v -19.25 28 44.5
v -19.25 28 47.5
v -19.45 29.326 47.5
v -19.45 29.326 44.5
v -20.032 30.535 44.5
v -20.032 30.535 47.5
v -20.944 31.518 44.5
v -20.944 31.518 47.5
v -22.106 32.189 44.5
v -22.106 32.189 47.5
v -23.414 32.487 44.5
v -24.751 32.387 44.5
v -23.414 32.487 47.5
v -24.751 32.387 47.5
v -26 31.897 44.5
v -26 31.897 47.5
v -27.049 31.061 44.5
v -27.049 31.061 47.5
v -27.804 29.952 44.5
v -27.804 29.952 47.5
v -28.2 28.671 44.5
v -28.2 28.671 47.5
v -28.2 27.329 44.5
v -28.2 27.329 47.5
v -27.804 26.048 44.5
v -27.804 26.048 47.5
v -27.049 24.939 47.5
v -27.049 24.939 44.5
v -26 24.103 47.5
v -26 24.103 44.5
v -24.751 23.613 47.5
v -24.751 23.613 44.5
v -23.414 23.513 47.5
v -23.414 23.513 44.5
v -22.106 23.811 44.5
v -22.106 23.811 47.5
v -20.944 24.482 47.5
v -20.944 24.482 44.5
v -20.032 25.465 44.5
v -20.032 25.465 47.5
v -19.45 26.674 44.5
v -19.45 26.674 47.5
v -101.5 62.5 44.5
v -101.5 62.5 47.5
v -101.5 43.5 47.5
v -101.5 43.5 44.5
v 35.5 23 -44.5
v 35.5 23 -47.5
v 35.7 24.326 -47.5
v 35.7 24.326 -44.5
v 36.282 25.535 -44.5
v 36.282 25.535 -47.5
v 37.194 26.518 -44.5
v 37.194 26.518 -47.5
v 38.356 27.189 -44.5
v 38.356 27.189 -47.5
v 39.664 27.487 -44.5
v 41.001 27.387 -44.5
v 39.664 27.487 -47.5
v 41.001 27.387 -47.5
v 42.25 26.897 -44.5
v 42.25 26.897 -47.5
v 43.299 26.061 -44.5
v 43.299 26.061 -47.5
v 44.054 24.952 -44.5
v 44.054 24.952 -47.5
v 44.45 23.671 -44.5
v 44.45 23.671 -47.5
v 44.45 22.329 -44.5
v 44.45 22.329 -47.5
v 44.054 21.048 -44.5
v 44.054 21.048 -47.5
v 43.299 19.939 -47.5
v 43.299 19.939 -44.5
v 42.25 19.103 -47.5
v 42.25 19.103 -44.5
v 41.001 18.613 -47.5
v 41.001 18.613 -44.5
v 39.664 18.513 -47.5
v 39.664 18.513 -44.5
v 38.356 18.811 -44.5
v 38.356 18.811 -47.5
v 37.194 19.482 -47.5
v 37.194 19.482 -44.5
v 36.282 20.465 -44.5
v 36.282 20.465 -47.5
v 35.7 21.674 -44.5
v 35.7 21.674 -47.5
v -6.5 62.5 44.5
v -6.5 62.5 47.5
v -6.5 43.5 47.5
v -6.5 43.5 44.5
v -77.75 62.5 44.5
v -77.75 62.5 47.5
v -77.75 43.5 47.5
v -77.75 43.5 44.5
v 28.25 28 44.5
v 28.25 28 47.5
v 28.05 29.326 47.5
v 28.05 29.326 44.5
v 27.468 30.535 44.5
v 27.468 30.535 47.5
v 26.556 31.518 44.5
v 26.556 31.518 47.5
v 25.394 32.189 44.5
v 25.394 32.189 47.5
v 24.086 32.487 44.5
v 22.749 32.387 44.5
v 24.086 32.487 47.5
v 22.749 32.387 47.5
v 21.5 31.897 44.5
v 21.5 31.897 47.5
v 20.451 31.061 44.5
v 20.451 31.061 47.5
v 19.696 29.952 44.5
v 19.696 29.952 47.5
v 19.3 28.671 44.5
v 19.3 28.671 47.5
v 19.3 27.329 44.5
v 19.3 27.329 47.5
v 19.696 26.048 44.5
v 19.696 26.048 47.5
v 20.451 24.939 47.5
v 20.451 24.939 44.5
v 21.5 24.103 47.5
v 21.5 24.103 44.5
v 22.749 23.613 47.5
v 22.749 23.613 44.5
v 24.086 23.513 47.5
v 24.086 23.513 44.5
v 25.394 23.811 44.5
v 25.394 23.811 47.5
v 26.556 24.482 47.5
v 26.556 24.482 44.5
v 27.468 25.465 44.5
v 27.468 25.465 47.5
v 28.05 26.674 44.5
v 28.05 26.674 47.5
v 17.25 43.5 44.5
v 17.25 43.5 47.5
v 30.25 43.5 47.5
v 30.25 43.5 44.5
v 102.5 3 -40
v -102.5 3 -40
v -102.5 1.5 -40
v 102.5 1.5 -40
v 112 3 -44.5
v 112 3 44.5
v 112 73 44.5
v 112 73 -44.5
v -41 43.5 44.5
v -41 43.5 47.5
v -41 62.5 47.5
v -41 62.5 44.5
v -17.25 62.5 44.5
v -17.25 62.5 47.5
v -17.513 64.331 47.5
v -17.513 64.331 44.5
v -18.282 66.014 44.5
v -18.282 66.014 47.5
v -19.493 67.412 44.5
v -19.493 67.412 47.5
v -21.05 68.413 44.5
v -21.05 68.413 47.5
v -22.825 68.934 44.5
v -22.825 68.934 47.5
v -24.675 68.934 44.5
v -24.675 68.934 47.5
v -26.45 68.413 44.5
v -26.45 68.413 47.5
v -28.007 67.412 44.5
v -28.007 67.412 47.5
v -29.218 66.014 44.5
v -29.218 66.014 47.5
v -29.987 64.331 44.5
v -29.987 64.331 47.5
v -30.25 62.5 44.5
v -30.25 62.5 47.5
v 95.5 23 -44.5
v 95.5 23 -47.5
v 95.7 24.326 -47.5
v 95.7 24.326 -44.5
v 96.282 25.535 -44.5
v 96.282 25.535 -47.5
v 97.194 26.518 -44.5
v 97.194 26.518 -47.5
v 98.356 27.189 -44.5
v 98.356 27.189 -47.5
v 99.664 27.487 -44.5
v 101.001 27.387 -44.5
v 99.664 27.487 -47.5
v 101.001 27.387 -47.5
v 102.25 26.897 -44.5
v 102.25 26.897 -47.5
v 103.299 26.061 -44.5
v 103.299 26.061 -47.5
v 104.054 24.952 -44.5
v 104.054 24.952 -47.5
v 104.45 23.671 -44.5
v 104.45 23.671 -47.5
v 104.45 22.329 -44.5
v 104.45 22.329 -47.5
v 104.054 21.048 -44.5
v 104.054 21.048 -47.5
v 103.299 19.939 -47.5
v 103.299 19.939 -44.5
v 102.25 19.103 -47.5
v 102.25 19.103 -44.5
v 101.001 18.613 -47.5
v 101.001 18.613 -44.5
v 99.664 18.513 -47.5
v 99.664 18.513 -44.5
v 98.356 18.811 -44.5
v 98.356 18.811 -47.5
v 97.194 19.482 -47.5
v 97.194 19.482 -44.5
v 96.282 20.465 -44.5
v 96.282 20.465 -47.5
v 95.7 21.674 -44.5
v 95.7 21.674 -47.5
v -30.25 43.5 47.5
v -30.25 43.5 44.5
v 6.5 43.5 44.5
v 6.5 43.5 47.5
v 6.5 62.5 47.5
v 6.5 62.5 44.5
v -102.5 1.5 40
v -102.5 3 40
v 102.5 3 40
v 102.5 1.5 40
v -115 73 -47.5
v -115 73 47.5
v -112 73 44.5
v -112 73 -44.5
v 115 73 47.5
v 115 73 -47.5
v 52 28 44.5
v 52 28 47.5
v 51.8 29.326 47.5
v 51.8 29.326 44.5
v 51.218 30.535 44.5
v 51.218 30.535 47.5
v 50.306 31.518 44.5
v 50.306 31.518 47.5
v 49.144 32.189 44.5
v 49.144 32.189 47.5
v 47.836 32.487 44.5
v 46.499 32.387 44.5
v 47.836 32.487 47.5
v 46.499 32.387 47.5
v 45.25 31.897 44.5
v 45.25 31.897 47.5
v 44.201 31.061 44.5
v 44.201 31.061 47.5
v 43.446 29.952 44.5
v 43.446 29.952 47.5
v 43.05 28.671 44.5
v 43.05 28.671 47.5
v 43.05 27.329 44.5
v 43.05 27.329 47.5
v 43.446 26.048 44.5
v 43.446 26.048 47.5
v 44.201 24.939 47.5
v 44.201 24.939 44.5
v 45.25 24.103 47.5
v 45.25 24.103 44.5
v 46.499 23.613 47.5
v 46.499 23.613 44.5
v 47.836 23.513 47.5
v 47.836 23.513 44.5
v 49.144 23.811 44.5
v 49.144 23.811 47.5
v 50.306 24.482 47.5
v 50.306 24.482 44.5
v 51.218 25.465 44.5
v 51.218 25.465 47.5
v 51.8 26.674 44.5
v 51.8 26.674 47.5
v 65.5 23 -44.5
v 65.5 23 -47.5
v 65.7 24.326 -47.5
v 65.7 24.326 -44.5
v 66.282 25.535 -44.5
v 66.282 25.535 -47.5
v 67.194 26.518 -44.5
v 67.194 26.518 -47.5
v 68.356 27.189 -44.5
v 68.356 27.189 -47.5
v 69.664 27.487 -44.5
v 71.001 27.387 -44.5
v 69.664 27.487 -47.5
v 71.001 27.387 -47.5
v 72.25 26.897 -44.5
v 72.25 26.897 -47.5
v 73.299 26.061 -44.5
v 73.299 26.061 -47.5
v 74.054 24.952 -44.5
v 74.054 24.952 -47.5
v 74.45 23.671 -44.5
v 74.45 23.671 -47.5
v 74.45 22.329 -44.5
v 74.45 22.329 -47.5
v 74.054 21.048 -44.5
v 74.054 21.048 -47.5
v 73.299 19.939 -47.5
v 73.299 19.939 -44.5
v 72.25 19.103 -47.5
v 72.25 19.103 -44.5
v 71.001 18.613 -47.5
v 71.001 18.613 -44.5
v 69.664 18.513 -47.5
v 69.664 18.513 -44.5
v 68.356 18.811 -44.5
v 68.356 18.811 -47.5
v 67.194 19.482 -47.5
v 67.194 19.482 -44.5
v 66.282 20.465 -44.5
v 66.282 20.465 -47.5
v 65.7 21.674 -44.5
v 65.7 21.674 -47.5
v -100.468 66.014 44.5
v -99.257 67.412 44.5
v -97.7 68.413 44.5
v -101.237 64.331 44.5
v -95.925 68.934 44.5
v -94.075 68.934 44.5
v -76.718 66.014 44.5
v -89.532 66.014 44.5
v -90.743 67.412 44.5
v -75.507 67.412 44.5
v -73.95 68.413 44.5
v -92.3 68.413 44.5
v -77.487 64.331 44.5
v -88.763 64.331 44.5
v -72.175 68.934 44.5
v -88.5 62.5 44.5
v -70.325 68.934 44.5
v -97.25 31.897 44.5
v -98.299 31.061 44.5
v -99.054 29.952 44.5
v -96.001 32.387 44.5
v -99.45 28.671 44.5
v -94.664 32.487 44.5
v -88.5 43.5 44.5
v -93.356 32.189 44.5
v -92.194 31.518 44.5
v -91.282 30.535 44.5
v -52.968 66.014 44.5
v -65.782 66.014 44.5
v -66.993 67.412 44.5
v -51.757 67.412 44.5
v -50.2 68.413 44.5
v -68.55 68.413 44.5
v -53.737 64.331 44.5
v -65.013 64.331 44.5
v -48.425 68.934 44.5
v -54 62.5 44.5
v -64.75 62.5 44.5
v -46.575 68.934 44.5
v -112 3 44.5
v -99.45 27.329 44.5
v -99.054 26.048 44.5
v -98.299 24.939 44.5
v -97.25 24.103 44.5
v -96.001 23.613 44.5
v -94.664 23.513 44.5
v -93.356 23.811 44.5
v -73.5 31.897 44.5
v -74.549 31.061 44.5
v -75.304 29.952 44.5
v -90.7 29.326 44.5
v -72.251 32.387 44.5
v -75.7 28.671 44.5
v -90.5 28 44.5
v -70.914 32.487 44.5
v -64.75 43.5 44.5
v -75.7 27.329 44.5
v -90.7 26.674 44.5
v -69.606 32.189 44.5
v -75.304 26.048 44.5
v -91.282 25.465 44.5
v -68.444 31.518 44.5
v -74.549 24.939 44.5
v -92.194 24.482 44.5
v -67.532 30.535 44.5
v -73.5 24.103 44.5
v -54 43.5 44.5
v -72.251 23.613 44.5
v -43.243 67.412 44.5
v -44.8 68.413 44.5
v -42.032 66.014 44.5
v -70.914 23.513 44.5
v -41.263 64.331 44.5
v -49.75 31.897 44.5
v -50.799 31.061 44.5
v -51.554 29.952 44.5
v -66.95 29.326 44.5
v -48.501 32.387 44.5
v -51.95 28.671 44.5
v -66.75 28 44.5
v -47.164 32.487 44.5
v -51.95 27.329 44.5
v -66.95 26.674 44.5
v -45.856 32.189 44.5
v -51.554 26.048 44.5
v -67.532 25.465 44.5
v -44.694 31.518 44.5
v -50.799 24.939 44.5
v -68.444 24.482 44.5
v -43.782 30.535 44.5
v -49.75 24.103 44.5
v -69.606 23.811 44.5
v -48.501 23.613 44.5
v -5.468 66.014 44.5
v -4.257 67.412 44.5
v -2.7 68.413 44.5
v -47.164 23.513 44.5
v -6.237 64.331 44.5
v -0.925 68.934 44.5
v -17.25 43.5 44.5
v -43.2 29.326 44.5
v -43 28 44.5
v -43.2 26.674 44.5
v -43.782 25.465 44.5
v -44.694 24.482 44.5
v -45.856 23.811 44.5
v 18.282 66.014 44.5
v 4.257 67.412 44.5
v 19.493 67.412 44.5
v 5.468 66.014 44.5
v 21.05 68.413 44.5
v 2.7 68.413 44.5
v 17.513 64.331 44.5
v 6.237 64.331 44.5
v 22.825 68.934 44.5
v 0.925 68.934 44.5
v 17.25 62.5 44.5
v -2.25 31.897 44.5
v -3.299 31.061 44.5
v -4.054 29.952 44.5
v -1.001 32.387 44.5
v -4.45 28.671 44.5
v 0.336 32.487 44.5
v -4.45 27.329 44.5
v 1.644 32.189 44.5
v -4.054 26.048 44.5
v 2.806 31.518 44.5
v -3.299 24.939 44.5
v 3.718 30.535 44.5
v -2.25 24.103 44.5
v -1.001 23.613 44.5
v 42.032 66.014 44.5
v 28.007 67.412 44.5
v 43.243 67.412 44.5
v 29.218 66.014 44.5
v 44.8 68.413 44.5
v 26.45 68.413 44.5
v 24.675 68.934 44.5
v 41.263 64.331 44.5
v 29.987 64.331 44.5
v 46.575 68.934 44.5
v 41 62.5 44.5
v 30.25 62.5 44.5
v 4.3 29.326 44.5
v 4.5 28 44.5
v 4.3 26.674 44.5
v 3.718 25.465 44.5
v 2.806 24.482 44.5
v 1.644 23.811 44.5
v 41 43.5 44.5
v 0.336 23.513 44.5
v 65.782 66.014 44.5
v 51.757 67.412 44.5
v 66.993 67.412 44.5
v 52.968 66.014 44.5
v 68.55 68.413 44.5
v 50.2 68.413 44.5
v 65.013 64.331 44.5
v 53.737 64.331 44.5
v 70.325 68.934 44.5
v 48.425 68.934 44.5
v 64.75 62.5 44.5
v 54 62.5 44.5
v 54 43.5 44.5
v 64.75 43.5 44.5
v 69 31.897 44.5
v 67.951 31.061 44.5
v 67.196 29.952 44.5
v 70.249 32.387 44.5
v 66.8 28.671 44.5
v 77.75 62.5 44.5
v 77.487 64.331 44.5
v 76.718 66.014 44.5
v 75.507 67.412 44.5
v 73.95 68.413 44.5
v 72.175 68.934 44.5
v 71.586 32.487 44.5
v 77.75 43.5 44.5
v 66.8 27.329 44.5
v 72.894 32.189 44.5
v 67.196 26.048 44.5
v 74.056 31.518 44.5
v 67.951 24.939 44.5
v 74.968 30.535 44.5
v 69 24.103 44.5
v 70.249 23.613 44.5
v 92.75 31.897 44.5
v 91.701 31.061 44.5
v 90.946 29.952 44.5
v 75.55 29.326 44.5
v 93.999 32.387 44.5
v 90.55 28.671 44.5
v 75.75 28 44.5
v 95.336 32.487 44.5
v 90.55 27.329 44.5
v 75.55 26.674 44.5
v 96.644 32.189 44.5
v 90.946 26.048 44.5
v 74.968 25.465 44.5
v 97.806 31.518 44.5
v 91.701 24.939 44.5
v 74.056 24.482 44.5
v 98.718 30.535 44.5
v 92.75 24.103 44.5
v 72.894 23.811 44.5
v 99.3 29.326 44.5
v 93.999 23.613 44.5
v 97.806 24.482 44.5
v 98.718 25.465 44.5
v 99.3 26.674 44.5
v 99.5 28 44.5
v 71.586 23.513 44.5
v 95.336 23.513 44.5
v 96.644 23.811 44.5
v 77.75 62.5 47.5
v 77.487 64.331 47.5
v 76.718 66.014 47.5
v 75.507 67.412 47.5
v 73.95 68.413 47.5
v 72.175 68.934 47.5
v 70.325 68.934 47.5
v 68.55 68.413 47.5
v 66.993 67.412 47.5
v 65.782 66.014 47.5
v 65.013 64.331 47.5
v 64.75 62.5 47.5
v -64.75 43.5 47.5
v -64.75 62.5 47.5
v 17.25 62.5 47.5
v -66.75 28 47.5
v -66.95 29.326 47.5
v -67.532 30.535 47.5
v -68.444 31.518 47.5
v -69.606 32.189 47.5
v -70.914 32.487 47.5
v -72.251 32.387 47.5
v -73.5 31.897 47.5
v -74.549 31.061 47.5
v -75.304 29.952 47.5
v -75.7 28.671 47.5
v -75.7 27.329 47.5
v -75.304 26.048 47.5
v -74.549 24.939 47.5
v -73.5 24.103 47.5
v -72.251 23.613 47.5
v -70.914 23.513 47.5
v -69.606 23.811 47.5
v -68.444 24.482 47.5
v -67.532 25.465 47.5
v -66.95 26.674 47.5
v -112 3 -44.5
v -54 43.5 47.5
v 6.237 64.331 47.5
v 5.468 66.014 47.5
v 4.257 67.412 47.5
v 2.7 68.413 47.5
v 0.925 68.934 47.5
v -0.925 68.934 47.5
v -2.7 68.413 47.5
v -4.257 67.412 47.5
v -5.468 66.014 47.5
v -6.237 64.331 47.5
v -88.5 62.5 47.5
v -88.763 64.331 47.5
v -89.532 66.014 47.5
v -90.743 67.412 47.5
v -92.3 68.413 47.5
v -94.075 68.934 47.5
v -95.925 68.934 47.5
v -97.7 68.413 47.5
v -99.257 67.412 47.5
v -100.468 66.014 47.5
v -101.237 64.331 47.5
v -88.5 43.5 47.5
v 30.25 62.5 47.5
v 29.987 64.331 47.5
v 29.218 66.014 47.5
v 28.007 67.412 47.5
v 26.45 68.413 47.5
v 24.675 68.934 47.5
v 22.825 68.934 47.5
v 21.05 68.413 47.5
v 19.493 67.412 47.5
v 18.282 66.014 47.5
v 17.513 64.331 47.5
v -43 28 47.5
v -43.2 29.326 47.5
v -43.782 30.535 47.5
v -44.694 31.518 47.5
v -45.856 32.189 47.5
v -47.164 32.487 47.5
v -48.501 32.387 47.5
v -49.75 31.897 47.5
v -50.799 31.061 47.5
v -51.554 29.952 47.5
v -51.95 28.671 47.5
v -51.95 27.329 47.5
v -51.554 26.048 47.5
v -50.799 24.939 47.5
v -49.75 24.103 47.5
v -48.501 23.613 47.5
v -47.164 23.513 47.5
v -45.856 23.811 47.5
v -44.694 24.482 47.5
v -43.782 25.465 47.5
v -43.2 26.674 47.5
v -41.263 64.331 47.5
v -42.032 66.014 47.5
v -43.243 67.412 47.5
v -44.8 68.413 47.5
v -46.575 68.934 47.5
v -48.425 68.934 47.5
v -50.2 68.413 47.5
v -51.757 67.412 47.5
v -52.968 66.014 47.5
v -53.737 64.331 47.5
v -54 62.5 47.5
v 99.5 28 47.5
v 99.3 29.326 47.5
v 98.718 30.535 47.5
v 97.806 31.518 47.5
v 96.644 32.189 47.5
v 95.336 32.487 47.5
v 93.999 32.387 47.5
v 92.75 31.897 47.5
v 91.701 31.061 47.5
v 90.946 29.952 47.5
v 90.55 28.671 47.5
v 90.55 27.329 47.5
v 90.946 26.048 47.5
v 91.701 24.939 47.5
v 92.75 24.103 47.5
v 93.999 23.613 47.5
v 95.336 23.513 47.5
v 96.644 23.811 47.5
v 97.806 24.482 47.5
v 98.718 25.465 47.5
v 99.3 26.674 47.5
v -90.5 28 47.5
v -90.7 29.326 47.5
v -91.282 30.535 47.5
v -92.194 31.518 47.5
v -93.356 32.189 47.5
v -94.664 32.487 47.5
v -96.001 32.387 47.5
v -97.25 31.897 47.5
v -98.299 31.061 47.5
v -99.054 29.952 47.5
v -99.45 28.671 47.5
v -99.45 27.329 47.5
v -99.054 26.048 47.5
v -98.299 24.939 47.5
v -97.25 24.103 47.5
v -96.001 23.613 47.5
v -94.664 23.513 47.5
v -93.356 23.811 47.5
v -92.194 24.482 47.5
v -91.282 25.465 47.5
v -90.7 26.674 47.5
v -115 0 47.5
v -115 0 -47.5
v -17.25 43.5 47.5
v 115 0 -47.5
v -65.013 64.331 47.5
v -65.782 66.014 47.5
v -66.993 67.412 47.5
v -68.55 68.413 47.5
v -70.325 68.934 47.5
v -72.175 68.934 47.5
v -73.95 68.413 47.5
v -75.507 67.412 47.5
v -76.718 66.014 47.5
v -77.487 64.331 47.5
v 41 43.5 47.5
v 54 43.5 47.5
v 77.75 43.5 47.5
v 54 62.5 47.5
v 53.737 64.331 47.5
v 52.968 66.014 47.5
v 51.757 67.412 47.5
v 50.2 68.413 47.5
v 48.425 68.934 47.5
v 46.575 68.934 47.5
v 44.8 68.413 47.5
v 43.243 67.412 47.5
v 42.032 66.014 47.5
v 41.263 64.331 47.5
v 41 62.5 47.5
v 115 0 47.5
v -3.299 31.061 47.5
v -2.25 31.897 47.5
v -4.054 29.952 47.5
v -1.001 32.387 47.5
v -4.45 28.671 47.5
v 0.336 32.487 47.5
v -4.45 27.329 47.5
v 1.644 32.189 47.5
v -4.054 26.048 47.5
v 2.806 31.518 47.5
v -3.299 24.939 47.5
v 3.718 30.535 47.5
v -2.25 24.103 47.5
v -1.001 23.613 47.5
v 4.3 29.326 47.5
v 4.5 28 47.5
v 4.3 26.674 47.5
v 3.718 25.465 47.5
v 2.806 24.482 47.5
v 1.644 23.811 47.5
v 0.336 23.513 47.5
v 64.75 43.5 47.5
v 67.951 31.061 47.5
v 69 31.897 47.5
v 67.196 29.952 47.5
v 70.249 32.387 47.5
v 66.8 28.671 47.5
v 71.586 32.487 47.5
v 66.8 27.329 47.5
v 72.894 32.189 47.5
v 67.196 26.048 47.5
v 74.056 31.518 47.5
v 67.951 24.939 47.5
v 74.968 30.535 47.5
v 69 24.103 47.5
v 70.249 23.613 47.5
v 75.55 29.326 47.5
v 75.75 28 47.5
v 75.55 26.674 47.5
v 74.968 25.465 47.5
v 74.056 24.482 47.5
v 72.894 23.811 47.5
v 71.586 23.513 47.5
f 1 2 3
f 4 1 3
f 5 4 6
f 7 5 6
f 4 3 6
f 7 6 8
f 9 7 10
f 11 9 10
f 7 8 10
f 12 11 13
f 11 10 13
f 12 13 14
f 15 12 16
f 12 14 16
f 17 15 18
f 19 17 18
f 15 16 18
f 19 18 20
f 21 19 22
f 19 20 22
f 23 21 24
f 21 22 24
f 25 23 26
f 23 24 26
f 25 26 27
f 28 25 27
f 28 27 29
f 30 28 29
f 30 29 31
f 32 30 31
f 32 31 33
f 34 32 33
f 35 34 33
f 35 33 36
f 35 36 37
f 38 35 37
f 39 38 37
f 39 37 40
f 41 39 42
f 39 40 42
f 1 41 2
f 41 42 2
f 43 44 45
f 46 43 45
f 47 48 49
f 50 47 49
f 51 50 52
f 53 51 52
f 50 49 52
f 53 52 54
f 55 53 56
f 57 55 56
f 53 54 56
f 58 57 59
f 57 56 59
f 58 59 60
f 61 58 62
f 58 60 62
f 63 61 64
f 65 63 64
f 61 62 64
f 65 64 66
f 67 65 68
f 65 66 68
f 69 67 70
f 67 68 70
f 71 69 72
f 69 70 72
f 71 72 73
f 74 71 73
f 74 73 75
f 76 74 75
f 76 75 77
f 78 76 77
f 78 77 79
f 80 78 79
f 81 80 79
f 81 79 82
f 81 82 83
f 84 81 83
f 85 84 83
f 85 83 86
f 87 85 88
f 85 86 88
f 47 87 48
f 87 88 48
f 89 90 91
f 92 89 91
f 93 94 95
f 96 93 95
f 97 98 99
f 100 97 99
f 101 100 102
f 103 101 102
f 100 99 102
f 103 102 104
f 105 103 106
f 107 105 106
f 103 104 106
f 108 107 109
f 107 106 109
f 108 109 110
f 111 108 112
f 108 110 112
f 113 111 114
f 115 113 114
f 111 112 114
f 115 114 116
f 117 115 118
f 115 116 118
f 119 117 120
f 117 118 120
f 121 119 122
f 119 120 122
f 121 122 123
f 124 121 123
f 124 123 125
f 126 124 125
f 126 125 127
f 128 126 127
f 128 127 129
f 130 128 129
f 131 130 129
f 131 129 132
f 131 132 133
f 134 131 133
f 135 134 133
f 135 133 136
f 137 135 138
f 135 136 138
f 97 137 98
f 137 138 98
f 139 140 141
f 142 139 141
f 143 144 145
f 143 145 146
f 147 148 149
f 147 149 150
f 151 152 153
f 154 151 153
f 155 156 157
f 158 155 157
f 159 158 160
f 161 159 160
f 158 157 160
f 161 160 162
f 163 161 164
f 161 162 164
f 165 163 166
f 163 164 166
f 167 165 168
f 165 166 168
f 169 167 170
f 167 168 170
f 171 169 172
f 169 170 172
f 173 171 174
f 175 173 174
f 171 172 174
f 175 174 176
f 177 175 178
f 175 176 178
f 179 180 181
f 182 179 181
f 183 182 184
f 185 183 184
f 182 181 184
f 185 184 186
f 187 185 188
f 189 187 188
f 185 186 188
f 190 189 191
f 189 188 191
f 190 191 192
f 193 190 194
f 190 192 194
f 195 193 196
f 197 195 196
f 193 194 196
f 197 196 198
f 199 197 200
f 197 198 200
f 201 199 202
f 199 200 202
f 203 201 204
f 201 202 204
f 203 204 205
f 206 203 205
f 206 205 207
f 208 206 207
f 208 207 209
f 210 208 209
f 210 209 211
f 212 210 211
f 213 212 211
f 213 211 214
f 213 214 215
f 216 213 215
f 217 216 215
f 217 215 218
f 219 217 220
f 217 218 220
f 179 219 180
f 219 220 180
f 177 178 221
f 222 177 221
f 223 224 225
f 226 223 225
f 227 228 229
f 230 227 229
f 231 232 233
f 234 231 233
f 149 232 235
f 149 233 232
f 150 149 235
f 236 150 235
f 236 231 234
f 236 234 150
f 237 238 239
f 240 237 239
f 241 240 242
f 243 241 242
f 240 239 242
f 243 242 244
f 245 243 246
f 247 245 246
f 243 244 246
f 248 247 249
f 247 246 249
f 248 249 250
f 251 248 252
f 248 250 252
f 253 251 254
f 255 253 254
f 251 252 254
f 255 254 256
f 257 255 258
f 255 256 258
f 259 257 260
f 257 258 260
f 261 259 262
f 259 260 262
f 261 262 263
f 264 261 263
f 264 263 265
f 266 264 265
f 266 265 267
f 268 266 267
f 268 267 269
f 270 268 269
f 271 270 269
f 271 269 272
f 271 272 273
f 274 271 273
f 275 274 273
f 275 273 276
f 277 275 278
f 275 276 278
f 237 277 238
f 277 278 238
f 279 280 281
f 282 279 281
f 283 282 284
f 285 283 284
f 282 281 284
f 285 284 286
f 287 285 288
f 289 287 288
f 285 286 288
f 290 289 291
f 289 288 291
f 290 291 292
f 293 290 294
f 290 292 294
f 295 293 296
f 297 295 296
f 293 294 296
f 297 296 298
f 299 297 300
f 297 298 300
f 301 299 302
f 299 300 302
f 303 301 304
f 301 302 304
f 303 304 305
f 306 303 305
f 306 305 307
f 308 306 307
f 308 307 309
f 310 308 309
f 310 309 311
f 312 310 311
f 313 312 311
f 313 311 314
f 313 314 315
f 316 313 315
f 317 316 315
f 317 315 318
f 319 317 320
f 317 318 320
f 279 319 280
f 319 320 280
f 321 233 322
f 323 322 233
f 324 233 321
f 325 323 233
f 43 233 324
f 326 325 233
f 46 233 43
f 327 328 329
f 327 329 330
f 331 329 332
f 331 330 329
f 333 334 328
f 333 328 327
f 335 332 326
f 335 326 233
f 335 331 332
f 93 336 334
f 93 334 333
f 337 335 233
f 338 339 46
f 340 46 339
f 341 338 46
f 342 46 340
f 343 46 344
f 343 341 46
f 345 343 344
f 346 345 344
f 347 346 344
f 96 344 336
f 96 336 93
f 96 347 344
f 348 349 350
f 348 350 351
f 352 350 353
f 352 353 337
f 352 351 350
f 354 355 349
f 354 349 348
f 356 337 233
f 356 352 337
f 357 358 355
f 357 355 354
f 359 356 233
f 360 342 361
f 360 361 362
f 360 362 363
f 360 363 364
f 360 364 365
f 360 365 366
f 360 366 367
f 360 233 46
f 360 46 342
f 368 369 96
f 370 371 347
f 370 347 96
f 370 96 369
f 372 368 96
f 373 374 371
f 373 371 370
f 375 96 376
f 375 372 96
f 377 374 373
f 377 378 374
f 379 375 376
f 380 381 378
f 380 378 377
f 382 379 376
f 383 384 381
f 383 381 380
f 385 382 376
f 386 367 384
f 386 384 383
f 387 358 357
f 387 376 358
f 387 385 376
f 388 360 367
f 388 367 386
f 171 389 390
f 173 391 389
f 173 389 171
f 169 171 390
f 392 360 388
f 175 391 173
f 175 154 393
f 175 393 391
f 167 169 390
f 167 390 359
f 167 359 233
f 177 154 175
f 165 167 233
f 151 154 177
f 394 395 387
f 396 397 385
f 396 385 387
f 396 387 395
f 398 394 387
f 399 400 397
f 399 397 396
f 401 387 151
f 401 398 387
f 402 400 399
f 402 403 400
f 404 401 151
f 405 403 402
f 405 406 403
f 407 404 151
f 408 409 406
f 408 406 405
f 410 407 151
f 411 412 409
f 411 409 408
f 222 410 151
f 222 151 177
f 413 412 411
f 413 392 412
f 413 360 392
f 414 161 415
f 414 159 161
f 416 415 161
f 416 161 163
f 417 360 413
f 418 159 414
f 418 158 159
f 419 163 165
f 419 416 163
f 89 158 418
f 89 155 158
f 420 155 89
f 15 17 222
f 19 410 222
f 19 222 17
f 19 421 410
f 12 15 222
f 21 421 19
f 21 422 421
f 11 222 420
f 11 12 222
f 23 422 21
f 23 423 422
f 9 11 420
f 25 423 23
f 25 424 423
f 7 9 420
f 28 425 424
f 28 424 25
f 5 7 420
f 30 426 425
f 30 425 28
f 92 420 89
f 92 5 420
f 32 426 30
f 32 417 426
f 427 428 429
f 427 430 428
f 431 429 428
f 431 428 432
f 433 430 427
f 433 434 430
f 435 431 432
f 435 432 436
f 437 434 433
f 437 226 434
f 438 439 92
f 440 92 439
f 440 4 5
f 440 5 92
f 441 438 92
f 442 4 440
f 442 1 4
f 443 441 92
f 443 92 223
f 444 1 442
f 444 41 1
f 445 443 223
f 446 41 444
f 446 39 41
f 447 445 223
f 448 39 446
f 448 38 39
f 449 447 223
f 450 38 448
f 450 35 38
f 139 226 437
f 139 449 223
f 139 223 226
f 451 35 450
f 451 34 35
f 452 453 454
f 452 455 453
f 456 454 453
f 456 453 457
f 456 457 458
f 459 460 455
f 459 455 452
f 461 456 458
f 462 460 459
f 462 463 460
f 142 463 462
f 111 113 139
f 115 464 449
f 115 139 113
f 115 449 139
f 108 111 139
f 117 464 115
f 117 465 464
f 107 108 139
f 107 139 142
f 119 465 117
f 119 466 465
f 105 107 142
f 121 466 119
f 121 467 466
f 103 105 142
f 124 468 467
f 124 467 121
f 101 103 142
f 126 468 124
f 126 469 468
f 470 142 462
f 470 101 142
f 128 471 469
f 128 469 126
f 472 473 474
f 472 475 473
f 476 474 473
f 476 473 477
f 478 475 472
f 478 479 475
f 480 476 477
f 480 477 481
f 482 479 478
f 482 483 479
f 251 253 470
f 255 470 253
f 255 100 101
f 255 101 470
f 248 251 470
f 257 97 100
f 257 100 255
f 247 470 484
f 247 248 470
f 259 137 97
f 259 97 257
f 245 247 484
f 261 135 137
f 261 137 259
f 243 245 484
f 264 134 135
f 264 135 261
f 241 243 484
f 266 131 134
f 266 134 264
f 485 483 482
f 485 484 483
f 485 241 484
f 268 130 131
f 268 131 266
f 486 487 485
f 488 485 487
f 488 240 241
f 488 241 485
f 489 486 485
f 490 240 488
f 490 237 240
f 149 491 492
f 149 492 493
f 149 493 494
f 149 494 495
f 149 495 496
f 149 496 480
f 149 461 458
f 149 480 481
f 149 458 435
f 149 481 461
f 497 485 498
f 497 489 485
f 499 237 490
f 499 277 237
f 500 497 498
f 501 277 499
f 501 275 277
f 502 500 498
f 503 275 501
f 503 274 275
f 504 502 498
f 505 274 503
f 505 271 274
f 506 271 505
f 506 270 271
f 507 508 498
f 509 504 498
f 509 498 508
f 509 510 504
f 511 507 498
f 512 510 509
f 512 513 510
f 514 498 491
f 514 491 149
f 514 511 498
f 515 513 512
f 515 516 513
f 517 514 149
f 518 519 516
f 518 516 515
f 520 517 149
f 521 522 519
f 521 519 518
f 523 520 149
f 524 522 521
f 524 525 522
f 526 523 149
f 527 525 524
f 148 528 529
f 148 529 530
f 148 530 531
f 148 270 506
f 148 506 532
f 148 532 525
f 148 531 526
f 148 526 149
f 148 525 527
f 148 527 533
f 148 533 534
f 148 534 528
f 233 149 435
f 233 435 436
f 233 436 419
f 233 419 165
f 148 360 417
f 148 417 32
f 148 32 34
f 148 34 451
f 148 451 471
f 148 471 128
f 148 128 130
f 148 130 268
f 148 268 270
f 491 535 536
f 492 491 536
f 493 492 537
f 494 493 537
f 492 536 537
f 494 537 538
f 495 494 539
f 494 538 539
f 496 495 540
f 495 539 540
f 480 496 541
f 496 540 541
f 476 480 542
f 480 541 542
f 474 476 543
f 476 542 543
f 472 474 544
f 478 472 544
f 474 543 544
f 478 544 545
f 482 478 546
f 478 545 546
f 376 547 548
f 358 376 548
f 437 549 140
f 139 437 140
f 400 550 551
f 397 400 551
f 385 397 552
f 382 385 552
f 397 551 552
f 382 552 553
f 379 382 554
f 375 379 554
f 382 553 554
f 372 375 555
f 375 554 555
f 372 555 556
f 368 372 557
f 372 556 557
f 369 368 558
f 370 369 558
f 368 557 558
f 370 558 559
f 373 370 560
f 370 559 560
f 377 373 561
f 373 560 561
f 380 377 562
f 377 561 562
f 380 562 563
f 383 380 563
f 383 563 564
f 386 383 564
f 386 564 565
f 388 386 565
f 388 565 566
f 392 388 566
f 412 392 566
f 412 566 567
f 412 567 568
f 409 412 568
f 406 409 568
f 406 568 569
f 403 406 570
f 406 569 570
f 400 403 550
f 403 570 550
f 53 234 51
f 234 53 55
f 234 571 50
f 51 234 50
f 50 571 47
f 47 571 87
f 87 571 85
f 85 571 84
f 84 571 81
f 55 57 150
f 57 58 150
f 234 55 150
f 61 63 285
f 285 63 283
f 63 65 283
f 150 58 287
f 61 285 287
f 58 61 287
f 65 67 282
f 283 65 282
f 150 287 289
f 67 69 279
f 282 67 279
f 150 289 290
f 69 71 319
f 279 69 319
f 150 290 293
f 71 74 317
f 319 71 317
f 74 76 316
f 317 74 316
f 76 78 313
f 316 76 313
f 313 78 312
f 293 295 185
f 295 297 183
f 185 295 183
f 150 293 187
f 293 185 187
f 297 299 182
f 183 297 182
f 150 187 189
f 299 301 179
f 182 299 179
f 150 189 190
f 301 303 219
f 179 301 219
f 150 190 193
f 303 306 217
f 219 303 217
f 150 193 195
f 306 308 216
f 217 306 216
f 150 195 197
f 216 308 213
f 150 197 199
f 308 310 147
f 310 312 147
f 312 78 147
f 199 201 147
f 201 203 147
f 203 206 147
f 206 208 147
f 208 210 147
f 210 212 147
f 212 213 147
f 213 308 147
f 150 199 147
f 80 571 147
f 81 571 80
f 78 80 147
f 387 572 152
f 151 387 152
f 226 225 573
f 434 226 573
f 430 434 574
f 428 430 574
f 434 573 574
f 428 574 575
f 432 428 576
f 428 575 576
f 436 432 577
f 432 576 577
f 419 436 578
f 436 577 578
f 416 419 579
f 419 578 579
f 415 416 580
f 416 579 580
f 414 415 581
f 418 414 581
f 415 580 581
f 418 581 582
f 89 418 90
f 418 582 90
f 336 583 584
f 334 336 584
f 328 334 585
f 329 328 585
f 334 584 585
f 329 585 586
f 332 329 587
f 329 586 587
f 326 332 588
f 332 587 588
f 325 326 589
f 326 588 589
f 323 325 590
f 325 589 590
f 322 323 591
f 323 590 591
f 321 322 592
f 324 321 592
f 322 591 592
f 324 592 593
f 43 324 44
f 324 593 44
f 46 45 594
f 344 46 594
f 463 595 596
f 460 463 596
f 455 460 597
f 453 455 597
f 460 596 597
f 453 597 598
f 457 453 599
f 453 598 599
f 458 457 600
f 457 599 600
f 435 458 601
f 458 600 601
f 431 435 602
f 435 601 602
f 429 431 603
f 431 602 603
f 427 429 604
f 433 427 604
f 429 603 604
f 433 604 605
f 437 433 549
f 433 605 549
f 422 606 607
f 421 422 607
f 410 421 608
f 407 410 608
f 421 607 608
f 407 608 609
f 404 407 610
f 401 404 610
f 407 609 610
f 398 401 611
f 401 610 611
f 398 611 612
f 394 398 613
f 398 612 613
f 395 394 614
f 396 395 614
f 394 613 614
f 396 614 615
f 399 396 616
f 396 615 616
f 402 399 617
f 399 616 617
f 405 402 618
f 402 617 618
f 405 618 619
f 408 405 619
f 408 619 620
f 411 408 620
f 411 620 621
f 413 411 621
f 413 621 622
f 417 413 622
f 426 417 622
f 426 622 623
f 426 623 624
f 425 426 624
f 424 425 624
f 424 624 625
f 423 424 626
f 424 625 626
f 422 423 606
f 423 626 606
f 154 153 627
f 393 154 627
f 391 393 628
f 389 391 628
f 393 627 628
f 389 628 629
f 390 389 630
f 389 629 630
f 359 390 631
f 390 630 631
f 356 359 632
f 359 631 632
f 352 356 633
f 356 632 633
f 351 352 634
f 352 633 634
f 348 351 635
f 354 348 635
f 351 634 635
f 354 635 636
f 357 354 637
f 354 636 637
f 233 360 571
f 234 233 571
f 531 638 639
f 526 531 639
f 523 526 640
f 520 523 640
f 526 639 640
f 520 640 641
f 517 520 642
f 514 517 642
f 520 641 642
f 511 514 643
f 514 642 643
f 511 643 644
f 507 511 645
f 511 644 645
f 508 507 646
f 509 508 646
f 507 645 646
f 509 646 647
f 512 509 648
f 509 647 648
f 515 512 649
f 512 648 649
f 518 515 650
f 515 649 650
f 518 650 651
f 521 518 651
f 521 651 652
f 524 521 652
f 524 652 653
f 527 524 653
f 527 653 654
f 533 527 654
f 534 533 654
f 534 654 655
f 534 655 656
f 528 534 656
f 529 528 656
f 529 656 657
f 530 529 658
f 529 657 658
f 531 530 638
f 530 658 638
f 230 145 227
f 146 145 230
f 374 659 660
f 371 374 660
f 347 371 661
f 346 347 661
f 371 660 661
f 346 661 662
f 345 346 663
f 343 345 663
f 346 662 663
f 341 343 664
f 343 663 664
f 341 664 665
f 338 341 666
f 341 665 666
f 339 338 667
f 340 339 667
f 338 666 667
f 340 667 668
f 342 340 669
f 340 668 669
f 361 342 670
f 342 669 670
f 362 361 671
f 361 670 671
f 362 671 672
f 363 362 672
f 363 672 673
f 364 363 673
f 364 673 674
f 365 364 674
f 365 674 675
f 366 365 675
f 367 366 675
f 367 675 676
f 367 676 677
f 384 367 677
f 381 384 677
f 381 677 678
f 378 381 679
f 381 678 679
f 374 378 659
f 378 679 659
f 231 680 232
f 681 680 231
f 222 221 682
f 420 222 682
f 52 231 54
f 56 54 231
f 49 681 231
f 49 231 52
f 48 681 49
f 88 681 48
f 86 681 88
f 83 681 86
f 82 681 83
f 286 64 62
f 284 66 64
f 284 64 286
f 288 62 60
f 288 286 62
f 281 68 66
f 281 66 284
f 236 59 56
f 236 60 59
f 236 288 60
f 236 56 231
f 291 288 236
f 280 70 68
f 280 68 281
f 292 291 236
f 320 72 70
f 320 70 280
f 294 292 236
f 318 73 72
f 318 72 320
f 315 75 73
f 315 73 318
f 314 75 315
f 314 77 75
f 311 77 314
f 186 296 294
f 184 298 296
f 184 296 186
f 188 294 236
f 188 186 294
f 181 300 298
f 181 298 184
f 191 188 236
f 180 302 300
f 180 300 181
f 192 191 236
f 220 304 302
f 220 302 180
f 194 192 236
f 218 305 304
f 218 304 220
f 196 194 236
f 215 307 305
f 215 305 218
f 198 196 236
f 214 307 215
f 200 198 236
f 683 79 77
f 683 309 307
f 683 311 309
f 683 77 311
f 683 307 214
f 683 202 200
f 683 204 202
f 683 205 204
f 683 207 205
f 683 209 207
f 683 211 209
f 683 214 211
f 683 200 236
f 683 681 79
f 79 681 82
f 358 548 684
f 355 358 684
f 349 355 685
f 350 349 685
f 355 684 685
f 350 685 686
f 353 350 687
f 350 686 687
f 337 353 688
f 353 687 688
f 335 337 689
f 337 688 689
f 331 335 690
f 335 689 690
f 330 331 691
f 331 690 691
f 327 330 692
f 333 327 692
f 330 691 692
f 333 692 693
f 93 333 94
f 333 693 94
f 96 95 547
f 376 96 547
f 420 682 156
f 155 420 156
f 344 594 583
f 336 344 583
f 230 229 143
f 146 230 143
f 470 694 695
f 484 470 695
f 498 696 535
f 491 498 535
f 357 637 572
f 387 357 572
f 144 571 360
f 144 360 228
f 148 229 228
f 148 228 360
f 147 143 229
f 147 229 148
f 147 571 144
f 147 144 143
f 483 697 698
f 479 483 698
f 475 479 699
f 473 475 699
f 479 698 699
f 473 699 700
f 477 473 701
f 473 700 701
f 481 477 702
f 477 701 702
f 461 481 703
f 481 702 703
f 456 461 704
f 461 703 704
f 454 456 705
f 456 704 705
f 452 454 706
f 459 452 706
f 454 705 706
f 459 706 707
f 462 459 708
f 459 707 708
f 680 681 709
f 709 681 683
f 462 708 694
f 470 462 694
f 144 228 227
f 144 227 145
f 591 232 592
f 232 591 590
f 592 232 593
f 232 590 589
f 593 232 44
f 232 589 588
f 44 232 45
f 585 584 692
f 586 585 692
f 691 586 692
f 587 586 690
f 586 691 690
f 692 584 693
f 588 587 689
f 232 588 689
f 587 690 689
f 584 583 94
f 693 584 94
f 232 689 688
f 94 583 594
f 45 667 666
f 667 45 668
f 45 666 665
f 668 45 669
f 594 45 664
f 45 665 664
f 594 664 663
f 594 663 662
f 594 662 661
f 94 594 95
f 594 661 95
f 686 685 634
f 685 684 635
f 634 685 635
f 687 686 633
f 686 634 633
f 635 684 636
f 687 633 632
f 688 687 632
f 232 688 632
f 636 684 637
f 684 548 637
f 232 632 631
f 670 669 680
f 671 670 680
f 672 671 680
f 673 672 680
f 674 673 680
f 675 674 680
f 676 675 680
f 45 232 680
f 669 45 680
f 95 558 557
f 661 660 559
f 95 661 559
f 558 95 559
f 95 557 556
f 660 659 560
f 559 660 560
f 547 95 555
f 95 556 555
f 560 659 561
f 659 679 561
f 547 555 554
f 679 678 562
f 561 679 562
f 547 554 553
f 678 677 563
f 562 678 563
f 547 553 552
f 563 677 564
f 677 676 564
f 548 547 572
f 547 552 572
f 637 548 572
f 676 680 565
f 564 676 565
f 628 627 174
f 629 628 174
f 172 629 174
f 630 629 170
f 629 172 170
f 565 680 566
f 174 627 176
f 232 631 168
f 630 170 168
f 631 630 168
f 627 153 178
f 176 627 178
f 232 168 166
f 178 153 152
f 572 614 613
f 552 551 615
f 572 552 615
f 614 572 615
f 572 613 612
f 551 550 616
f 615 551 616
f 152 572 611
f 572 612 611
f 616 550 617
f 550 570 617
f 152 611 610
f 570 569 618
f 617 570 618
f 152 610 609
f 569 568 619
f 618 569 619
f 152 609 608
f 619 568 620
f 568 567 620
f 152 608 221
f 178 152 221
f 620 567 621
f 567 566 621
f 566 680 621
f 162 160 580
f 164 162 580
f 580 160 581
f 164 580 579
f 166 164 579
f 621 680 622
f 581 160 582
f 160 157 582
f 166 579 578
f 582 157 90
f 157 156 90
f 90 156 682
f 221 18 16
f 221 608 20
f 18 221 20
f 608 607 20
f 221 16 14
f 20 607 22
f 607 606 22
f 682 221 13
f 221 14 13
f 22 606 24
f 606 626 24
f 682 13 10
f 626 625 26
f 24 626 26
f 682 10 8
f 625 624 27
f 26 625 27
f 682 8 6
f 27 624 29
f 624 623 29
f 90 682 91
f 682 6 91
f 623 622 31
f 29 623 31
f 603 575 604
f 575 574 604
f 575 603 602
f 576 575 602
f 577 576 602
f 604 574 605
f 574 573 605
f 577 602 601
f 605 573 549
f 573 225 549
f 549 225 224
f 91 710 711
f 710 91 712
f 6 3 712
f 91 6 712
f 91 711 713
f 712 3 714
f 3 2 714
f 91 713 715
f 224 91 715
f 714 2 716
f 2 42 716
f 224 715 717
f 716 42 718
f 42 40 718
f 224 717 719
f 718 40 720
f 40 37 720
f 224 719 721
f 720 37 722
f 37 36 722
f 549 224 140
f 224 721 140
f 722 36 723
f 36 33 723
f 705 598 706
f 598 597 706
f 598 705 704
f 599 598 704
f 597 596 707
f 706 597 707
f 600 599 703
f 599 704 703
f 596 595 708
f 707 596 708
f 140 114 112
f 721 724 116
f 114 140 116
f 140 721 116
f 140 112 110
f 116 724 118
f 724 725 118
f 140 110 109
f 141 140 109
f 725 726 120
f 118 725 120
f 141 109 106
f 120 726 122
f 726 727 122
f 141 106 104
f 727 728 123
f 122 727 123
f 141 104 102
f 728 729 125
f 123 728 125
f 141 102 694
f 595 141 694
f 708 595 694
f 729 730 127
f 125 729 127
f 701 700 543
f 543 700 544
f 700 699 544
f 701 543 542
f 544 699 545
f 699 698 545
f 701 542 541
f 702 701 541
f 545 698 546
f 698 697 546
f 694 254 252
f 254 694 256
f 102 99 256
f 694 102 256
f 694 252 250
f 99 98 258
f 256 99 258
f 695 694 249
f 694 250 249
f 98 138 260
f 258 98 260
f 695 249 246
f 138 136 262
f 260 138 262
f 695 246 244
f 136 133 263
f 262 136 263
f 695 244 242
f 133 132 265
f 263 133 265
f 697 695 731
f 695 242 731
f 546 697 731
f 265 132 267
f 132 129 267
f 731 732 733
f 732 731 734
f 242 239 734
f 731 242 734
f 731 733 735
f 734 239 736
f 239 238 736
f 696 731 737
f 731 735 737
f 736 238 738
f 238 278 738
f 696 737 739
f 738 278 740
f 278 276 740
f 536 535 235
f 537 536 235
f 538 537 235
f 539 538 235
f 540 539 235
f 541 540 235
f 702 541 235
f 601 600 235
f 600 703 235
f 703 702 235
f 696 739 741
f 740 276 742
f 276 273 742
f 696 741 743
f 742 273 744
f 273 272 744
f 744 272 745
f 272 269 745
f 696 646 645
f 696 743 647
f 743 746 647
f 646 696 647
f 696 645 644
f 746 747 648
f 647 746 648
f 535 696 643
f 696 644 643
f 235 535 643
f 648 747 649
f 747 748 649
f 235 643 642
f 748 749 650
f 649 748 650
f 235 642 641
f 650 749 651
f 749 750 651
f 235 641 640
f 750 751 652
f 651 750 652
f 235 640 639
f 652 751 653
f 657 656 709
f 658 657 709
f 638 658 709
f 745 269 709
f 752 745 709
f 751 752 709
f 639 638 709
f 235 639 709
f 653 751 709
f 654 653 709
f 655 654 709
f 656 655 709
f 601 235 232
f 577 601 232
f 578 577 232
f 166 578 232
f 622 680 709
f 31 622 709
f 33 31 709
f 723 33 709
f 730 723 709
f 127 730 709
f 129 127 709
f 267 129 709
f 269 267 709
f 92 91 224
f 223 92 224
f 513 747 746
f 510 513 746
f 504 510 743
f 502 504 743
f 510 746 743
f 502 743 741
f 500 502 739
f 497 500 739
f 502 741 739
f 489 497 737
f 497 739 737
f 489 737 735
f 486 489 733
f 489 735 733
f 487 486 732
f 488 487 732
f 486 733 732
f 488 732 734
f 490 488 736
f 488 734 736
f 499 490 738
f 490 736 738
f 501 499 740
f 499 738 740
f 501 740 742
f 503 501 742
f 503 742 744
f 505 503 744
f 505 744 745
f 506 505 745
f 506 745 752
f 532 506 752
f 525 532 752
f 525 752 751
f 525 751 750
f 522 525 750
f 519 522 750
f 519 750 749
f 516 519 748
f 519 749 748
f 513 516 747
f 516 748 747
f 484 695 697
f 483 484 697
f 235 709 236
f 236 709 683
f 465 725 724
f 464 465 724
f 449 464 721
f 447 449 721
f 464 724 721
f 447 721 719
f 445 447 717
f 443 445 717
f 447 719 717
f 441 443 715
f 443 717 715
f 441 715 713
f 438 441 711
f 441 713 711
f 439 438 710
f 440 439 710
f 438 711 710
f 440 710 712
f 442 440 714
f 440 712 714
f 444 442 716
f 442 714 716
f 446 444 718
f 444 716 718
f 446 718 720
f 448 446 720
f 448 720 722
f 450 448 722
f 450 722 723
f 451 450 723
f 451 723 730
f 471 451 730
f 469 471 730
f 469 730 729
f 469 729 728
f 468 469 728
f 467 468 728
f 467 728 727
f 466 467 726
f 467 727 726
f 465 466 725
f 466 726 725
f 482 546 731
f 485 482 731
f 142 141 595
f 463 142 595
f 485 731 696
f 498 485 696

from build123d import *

# Parameters (mm, degrees)
SKETCH1_W           = 230
SKETCH1_H           = 95
BOSS_EXTRUDE1_DEPTH = 3
SKETCH2_W           = 205
SKETCH2_H           = 80
CUT_EXTRUDE1_DEPTH  = 1.5
SKETCH3_W           = 230
SKETCH3_H           = 95
SKETCH3_W_2         = 224
SKETCH3_H_2         = 89
BOSS_EXTRUDE2_DEPTH = 70
SKETCH4_R           = 4.5
CUT_EXTRUDE2_DEPTH  = 3
SKETCH5_R           = 4.5
CUT_EXTRUDE3_DEPTH  = 3


with BuildPart() as part:
    # Sketch1 → Boss-Extrude1 (new body)
    with BuildSketch(Plane(origin=(0, 0, 0), x_dir=(1, 0, 0), z_dir=(0, 1, 0))):
        Rectangle(SKETCH1_W, SKETCH1_H)
    extrude(amount=BOSS_EXTRUDE1_DEPTH)

    # Sketch2 → Cut-Extrude1 (cut)
    with BuildSketch(Plane(origin=(0, 3, 0), x_dir=(1, 0, 0), z_dir=(0, 1, 0))):
        Rectangle(SKETCH2_W, SKETCH2_H)
    extrude(amount=-CUT_EXTRUDE1_DEPTH, mode=Mode.SUBTRACT)

    # Sketch3 → Boss-Extrude2 (add)
    with BuildSketch(Plane(origin=(0, 3, 0), x_dir=(1, 0, 0), z_dir=(0, 1, 0))):
        Rectangle(SKETCH3_W, SKETCH3_H)
        Rectangle(SKETCH3_W_2, SKETCH3_H_2, mode=Mode.SUBTRACT)
    extrude(amount=BOSS_EXTRUDE2_DEPTH)

    # Sketch4 → Cut-Extrude2 (cut)
    with BuildSketch(Plane.XY.offset(47.5)):
        with Locations((95, 28)):
            Circle(SKETCH4_R)
        with Locations((71.25, 28)):
            Circle(SKETCH4_R)
        with Locations((47.5, 28)):
            Circle(SKETCH4_R)
        with Locations((23.75, 28)):
            Circle(SKETCH4_R)
        with Locations((0, 28)):
            Circle(SKETCH4_R)
        with Locations((-23.75, 28)):
            Circle(SKETCH4_R)
        with Locations((-47.5, 28)):
            Circle(SKETCH4_R)
        with Locations((-71.25, 28)):
            Circle(SKETCH4_R)
        with Locations((-95, 28)):
            Circle(SKETCH4_R)
        with BuildLine():
            Line((-101.5, 62.5), (-101.5, 43.5))
            Line((-101.5, 43.5), (-88.5, 43.5))
            Line((-88.5, 43.5), (-88.5, 62.5))
            ThreePointArc((-88.5, 62.5), (-95, 69), (-101.5, 62.5))
        make_face()
        with BuildLine():
            Line((-77.75, 62.5), (-77.75, 43.5))
            Line((-77.75, 43.5), (-64.75, 43.5))
            Line((-64.75, 43.5), (-64.75, 62.5))
            ThreePointArc((-64.75, 62.5), (-71.25, 69), (-77.75, 62.5))
        make_face()
        with BuildLine():
            Line((-54, 62.5), (-54, 43.5))
            Line((-54, 43.5), (-41, 43.5))
            Line((-41, 43.5), (-41, 62.5))
            ThreePointArc((-41, 62.5), (-47.5, 69), (-54, 62.5))
        make_face()
        with BuildLine():
            Line((-30.25, 62.5), (-30.25, 43.5))
            Line((-30.25, 43.5), (-17.25, 43.5))
            Line((-17.25, 43.5), (-17.25, 62.5))
            ThreePointArc((-17.25, 62.5), (-23.75, 69), (-30.25, 62.5))
        make_face()
        with BuildLine():
            Line((-6.5, 62.5), (-6.5, 43.5))
            Line((-6.5, 43.5), (6.5, 43.5))
            Line((6.5, 43.5), (6.5, 62.5))
            ThreePointArc((6.5, 62.5), (0, 69), (-6.5, 62.5))
        make_face()
        with BuildLine():
            Line((17.25, 62.5), (17.25, 43.5))
            Line((17.25, 43.5), (30.25, 43.5))
            Line((30.25, 43.5), (30.25, 62.5))
            ThreePointArc((30.25, 62.5), (23.75, 69), (17.25, 62.5))
        make_face()
        with BuildLine():
            Line((41, 62.5), (41, 43.5))
            Line((41, 43.5), (54, 43.5))
            Line((54, 43.5), (54, 62.5))
            ThreePointArc((54, 62.5), (47.5, 69), (41, 62.5))
        make_face()
        with BuildLine():
            Line((64.75, 62.5), (64.75, 43.5))
            Line((64.75, 43.5), (77.75, 43.5))
            Line((77.75, 43.5), (77.75, 62.5))
            ThreePointArc((77.75, 62.5), (71.25, 69), (64.75, 62.5))
        make_face()
    extrude(amount=-CUT_EXTRUDE2_DEPTH, mode=Mode.SUBTRACT)

    # Sketch5 → Cut-Extrude3 (cut)
    with BuildSketch(Plane(origin=(0, 0, -47.5), x_dir=(-1, 0, 0), z_dir=(0, 0, -1))):
        with Locations((-100, 23)):
            Circle(SKETCH5_R)
        with Locations((-70, 23)):
            Circle(SKETCH5_R)
        with Locations((-40, 23)):
            Circle(SKETCH5_R)
    extrude(amount=-CUT_EXTRUDE3_DEPTH, mode=Mode.SUBTRACT)


solid = part.part
